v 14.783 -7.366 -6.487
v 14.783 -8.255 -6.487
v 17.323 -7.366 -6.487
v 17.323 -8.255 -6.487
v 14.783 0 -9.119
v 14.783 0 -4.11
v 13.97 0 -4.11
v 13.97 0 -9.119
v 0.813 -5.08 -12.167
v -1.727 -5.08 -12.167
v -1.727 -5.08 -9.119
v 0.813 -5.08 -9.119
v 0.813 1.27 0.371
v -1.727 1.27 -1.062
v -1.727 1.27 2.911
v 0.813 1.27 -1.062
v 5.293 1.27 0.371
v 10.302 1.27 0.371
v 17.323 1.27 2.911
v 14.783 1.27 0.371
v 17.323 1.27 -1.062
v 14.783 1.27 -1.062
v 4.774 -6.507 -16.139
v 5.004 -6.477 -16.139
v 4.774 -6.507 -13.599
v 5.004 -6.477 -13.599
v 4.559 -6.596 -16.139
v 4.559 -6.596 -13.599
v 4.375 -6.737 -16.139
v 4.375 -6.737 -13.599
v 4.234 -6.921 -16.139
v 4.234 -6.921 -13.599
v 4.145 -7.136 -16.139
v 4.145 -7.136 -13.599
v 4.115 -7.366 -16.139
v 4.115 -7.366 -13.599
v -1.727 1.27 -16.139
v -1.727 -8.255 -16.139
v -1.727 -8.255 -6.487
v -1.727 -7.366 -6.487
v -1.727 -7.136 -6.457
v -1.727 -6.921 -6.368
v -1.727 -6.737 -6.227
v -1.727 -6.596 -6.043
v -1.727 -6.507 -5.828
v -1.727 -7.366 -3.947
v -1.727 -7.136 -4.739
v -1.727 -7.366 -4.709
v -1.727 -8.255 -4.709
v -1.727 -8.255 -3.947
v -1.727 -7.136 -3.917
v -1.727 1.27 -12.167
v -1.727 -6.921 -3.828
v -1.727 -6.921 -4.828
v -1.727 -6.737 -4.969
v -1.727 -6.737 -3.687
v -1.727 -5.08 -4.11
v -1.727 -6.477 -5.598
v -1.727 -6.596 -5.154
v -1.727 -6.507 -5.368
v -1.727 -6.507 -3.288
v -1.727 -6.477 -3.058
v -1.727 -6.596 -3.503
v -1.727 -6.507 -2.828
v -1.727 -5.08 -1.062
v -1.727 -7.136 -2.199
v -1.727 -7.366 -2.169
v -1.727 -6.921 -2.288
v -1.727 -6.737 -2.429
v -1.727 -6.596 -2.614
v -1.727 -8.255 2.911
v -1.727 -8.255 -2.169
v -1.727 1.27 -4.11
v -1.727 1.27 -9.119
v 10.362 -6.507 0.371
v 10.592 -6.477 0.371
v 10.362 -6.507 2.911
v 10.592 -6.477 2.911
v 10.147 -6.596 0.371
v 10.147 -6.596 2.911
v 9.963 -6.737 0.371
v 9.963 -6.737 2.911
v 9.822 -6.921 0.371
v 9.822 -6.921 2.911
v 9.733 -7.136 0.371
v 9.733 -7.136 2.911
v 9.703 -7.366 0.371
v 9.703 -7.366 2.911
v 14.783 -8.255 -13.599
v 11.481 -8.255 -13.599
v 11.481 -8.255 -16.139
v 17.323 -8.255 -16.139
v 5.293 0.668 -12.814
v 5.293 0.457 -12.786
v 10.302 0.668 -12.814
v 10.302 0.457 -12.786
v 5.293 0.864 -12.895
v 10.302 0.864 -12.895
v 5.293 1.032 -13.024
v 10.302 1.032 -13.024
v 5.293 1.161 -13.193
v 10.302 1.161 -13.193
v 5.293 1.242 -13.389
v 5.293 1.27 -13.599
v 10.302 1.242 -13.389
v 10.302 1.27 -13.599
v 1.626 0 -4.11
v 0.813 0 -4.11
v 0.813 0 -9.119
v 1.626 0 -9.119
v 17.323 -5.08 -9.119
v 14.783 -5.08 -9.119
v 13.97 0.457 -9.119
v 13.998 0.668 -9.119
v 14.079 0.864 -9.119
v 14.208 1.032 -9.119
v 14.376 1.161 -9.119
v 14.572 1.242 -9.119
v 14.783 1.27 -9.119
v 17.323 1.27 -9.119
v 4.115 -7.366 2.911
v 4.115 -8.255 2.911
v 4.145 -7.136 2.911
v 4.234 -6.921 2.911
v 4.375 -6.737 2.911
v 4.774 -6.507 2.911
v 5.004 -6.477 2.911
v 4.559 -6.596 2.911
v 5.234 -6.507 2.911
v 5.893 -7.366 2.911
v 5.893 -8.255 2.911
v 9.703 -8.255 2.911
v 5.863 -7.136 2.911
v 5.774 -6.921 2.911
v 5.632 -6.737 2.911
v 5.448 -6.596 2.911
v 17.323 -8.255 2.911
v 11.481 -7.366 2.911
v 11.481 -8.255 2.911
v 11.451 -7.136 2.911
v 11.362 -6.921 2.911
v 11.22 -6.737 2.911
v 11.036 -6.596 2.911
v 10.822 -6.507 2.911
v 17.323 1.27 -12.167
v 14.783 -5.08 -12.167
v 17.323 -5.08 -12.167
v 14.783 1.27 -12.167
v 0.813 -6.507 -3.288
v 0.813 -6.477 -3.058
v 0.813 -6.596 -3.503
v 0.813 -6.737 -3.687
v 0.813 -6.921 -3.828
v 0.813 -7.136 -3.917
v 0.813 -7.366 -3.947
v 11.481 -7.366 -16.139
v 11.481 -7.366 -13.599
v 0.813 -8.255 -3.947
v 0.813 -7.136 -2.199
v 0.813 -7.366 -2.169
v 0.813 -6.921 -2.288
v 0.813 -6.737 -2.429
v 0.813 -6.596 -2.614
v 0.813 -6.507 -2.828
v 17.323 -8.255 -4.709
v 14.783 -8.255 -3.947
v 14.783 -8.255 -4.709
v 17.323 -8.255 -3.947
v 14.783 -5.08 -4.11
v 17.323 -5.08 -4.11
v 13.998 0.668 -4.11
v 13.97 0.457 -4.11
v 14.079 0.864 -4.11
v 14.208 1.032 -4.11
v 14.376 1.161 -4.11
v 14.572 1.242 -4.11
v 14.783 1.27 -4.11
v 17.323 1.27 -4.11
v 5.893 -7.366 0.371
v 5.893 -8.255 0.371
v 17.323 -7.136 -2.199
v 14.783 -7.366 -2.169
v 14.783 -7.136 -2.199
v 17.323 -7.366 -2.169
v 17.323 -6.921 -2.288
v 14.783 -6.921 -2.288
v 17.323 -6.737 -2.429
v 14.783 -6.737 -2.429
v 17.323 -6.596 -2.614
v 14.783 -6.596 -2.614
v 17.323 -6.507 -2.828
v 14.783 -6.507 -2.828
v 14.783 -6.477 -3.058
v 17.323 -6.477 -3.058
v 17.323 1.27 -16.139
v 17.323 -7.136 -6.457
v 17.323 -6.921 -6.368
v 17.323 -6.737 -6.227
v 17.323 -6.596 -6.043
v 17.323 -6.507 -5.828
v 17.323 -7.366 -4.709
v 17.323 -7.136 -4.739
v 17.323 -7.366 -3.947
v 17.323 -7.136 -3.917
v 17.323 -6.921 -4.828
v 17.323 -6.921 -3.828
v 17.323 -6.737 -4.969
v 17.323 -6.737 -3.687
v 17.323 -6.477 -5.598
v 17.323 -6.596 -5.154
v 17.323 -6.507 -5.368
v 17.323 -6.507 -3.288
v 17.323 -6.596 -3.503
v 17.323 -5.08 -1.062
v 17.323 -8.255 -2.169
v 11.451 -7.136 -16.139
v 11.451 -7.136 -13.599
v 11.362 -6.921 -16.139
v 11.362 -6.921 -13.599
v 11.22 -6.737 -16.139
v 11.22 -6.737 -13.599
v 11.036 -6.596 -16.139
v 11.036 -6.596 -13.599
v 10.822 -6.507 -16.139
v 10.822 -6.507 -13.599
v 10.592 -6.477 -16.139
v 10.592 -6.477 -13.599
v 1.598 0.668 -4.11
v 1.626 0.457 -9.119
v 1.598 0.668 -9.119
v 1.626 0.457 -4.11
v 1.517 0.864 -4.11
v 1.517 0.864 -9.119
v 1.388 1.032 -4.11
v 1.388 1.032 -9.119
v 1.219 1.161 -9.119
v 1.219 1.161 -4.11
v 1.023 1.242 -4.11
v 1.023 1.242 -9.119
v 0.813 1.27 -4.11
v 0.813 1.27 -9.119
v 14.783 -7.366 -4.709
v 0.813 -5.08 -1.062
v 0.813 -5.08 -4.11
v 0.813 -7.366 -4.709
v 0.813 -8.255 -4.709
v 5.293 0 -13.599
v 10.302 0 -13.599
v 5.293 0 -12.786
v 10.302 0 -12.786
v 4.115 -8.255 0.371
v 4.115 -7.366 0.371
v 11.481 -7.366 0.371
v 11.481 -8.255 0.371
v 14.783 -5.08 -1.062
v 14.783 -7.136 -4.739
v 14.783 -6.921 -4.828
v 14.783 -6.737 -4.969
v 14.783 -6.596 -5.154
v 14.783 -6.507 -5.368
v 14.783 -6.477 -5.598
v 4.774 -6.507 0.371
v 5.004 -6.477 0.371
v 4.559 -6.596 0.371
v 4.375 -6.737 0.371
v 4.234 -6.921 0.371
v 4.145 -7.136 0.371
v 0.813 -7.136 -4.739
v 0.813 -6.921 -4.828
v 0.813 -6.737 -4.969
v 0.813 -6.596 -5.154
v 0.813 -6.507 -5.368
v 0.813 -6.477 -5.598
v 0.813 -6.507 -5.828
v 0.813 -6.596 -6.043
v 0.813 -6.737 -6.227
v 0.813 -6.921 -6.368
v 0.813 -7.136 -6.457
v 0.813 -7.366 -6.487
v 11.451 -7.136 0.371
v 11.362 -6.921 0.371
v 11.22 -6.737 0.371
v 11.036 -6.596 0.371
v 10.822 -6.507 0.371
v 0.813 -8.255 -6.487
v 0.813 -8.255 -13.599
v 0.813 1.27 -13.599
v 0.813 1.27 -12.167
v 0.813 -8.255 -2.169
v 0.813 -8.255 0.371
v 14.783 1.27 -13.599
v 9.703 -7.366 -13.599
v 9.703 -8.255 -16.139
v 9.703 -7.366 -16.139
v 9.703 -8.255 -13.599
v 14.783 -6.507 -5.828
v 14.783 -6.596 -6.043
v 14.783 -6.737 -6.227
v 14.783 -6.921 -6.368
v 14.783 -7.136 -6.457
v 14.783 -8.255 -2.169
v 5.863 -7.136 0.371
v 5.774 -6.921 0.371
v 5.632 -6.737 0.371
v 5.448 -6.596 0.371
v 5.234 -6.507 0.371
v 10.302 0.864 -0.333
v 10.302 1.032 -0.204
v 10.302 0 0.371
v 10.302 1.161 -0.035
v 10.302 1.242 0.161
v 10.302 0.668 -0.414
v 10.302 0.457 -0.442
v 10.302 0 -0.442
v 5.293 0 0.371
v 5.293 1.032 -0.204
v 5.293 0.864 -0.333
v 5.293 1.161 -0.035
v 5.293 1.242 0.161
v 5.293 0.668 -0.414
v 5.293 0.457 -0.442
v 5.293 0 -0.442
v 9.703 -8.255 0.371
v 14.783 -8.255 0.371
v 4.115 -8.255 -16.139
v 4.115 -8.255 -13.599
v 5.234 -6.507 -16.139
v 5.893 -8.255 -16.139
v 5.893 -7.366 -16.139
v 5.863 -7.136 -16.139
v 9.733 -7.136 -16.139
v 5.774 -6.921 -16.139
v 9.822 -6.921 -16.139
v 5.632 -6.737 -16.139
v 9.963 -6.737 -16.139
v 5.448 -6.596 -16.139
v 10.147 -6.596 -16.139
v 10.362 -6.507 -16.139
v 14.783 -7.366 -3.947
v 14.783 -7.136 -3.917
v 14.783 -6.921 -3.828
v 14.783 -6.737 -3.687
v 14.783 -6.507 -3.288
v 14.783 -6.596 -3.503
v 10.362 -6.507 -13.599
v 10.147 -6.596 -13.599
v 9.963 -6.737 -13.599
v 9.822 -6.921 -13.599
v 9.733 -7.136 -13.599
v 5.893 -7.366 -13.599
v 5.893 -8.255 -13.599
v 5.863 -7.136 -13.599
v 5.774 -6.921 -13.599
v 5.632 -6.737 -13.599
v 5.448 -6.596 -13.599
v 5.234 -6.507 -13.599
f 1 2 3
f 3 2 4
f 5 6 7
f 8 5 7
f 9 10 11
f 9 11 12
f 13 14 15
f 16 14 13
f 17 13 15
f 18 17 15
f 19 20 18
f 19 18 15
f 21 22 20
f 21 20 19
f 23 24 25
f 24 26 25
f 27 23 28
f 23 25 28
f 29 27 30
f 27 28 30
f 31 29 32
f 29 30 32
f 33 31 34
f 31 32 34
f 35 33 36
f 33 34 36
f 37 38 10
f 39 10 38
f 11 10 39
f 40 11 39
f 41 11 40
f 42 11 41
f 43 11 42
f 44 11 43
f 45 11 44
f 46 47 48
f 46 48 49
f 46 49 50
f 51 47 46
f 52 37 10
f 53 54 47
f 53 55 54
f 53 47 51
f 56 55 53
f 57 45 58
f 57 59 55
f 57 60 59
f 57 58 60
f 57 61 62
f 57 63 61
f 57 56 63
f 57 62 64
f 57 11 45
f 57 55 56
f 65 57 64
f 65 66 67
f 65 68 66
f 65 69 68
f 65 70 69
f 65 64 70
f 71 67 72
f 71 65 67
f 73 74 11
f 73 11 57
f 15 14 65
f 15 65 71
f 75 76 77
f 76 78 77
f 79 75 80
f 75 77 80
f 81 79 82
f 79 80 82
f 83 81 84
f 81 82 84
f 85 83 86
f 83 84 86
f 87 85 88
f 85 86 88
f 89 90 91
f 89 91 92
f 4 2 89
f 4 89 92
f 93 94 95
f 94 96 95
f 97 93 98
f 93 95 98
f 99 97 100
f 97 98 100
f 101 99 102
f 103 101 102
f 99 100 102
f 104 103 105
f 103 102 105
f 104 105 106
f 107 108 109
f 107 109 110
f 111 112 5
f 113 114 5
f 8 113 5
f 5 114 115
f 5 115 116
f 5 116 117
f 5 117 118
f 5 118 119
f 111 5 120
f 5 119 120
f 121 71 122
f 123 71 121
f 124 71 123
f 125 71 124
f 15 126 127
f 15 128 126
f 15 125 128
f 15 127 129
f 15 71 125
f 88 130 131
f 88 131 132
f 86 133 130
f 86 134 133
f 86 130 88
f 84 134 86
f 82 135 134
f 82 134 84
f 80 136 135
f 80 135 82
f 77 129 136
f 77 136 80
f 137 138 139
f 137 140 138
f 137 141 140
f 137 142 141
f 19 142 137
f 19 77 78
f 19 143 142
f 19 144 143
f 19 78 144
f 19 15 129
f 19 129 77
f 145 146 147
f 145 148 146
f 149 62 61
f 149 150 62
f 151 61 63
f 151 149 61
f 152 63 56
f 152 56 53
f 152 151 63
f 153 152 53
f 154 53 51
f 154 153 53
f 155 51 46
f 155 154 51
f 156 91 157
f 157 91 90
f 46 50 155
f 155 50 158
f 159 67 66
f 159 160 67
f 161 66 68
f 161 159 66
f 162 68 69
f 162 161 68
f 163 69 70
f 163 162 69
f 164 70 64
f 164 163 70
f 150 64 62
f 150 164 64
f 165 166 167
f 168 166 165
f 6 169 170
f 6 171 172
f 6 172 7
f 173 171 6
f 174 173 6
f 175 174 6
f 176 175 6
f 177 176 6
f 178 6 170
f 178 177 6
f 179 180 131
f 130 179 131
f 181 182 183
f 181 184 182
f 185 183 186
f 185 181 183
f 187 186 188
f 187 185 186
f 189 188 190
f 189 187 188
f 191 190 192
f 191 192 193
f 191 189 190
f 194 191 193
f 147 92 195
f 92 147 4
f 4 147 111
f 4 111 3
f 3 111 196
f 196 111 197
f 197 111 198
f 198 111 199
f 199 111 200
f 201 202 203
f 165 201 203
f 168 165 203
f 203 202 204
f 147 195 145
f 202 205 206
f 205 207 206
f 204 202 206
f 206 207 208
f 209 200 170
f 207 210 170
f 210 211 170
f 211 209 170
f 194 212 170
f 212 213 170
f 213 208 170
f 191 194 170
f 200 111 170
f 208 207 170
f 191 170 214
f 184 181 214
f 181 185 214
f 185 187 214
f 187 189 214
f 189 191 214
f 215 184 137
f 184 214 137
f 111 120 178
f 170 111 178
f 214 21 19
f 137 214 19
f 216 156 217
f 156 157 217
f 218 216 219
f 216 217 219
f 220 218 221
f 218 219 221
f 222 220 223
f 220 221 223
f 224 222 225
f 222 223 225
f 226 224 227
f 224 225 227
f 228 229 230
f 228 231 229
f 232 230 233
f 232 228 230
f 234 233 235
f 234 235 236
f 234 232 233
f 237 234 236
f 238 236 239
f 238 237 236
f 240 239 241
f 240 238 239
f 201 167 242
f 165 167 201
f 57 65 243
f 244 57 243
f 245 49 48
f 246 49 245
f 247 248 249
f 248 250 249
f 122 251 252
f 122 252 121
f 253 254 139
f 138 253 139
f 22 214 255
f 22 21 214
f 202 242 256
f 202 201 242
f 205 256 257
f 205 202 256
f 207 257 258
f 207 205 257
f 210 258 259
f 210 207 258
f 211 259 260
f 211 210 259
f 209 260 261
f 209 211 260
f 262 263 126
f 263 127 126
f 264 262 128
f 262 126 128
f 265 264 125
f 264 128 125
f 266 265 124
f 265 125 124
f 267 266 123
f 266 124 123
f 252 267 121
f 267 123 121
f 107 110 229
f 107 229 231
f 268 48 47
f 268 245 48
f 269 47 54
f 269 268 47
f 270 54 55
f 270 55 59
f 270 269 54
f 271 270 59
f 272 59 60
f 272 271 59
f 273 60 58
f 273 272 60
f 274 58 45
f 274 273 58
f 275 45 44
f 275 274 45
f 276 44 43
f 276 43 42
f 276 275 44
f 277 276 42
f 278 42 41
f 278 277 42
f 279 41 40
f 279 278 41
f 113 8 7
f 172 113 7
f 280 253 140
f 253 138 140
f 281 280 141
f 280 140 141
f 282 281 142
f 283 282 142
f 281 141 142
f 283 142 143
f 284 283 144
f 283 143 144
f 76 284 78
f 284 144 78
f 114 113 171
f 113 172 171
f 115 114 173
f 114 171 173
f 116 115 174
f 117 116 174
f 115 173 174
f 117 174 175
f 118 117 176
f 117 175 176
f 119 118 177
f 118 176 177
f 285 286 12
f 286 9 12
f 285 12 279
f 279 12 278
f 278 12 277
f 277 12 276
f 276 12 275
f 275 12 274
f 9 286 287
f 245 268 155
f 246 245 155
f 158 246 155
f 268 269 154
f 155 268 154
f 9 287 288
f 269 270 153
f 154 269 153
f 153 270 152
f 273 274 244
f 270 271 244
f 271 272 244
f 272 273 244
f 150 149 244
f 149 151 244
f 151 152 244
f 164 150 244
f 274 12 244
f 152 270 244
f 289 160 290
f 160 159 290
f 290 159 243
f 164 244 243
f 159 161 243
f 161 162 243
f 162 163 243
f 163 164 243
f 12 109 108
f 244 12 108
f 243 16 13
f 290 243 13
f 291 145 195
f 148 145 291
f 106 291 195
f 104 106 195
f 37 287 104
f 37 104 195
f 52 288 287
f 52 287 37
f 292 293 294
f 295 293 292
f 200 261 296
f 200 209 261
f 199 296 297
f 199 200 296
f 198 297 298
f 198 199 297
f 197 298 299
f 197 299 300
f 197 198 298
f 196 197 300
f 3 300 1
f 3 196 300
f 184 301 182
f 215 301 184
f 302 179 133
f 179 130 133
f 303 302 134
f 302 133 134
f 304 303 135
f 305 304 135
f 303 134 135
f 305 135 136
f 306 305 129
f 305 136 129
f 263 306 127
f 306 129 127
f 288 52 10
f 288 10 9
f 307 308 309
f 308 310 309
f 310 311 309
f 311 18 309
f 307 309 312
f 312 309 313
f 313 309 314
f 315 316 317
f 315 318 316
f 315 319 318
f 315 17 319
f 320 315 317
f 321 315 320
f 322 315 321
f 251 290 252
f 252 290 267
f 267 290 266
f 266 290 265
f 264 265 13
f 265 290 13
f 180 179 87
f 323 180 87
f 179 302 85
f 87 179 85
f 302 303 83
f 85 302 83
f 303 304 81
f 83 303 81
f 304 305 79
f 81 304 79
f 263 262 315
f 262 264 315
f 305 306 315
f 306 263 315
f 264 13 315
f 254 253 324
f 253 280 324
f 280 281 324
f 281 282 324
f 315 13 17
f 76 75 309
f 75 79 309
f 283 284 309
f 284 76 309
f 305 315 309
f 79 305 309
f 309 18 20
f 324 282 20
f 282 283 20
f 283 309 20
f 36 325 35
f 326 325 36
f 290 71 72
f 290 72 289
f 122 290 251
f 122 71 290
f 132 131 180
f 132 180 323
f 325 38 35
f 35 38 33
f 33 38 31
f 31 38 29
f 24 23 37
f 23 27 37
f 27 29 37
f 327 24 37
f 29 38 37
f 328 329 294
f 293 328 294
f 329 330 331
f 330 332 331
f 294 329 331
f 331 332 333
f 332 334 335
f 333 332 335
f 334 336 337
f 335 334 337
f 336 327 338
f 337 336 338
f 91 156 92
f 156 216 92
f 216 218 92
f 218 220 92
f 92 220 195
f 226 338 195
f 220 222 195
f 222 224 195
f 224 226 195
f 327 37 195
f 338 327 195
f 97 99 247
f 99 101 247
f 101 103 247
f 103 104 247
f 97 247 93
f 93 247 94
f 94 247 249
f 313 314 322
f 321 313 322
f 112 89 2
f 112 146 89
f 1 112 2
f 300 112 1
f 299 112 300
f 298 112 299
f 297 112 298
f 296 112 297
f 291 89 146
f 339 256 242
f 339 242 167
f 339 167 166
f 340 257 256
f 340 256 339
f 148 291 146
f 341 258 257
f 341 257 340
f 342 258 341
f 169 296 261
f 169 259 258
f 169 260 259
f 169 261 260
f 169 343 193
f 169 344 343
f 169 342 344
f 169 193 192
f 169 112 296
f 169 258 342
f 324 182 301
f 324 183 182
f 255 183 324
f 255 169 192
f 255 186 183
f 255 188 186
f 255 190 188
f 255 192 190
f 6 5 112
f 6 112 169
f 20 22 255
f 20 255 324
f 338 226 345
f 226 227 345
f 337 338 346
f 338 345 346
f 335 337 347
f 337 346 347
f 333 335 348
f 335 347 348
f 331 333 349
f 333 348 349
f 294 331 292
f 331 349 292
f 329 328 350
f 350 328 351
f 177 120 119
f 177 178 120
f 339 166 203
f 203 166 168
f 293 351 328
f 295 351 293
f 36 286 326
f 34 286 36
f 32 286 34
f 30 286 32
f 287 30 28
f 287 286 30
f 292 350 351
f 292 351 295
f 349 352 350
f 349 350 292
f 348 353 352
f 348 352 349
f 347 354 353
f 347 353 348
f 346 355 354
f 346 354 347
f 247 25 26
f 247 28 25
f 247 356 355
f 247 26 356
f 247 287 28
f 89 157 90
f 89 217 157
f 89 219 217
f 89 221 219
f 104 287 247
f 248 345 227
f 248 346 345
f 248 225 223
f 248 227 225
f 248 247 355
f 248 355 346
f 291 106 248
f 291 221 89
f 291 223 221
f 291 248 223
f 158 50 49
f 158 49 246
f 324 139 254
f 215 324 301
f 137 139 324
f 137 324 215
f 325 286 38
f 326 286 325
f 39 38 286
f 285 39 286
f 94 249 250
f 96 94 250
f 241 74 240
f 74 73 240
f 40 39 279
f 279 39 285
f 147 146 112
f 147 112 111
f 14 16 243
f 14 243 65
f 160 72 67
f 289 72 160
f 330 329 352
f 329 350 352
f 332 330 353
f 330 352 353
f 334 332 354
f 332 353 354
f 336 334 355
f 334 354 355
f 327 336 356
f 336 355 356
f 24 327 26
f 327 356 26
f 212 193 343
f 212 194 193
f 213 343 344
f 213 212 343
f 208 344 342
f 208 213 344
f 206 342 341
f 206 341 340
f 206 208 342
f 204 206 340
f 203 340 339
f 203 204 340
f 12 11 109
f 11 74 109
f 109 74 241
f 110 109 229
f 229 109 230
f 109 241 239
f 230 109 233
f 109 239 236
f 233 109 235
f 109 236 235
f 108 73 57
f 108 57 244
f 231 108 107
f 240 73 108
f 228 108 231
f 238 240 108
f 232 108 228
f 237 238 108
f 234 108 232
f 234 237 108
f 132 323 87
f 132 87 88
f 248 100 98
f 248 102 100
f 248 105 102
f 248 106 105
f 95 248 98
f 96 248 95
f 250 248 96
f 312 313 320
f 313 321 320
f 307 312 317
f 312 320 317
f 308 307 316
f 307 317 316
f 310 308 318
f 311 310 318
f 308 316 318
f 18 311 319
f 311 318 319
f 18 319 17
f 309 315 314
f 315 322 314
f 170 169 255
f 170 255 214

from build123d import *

# Parameters (mm, degrees)
BOSS_EXTRUDE1_DEPTH   = 1.27
SKETCH1_W             = 3.3528
SKETCH1_H             = 2.50444
BOSS_EXTRUDE1_2_DEPTH = 1.27
FILLET3_R             = 0.8128
FILLET4_R             = 0.8128
SKETCH5_W             = 2.54
SKETCH5_H             = 5.00888
BOSS_EXTRUDE3_DEPTH   = 5.08
SKETCH6_W             = 19.05
SKETCH6_H             = 19.05
SKETCH6_W_2           = 13.97
SKETCH6_H_2           = 13.97
BOSS_EXTRUDE4_DEPTH   = 3.175
SKETCH7_W             = 2.54
SKETCH7_H             = 1.778
SKETCH7_W_2           = 1.778
SKETCH7_H_2           = 2.54
CUT_EXTRUDE2_DEPTH    = 1.778
FILLET6_R             = 0.889


with BuildPart() as part:
    # Sketch1 → Boss-Extrude1 (new body)
    with BuildSketch(Plane(origin=(0, 0, 0), x_dir=(1, 0, 0), z_dir=(0, 1, 0))):
        Polygon((0.8128, 1.061632718), (0.8128, -0.370927282), (5.29336, -0.370927282), (5.29336, 0.441872718), (7.7978, 0.441872718), (7.7978, -2.910927282), (-1.7272, -2.910927282), (-1.7272, 1.061632718), align=None)
    extrude(amount=BOSS_EXTRUDE1_DEPTH)

    # Fillet3
    fillet3_edges = [part.edges().sort_by_distance(p)[0] for p in [
        (6.54558, 1.27, -0.441872718),
    ]]
    fillet(fillet3_edges, radius=FILLET3_R)


with BuildPart() as body_2:
    # Sketch1 → Boss-Extrude1 2 (new body)
    with BuildSketch(Plane(origin=(0, 0, 0), x_dir=(1, 0, 0), z_dir=(0, 1, 0))):
        with Locations((-0.0508, 5.361852718)):
            Rectangle(SKETCH1_W, SKETCH1_H)
    extrude(amount=BOSS_EXTRUDE1_2_DEPTH)

    # Fillet4
    fillet4_edges = [body_2.edges().sort_by_distance(p)[0] for p in [
        (1.6256, 1.27, -5.361852718),
    ]]
    fillet(fillet4_edges, radius=FILLET4_R)


with BuildPart() as body_3:
    # Mirror6: mirrored copy
    add(part.part.mirror(Plane(origin=(7.7978, 1.27, -0.441872718), x_dir=(0, 0, 1), z_dir=(-1, 0, 0))))


with BuildPart() as body_4:
    # Mirror6 2: mirrored copy
    add(body_2.part.mirror(Plane(origin=(7.7978, 1.27, -0.441872718), x_dir=(0, 0, 1), z_dir=(-1, 0, 0))))


with BuildPart() as body_5:
    # Mirror7: mirrored copy
    add(body_3.part.mirror(Plane(origin=(17.3228, 1.27, -6.614072718), x_dir=(1, 0, 0), z_dir=(0, 0, 1))))


with BuildPart() as body_6:
    # Mirror7 2: mirrored copy
    add(body_4.part.mirror(Plane(origin=(17.3228, 1.27, -6.614072718), x_dir=(1, 0, 0), z_dir=(0, 0, 1))))


with BuildPart() as body_7:
    # Mirror8: mirrored copy
    add(body_5.part.mirror(Plane(origin=(7.7978, 1.27, -12.786272718), x_dir=(0, 0, 1), z_dir=(1, 0, 0))))


with BuildPart() as body_8:
    # Mirror8 2: mirrored copy
    add(body_6.part.mirror(Plane(origin=(7.7978, 1.27, -12.786272718), x_dir=(0, 0, 1), z_dir=(1, 0, 0))))


with BuildPart() as part_1:
    add(part.part)

    add(body_2.part)  # Boss-Extrude3 merges body 2

    add(body_3.part)  # Boss-Extrude3 merges body 3

    add(body_4.part)  # Boss-Extrude3 merges body 4

    add(body_5.part)  # Boss-Extrude3 merges body 5

    add(body_6.part)  # Boss-Extrude3 merges body 6

    add(body_7.part)  # Boss-Extrude3 merges body 7

    add(body_8.part)  # Boss-Extrude3 merges body 8
    # Sketch5 → Boss-Extrude3 (add)
    with BuildSketch(Plane.XZ):
        Polygon((17.3228, -1.061632718), (14.7828, -1.061632718), (14.7828, 0.370927282), (0.8128, 0.370927282), (0.8128, -1.061632718), (-1.7272, -1.061632718), (-1.7272, 2.910927282), (17.3228, 2.910927282), align=None)
        Polygon((17.3228, -16.139072718), (-1.7272, -16.139072718), (-1.7272, -12.166512718), (0.8128, -12.166512718), (0.8128, -13.599072718), (14.7828, -13.599072718), (14.7828, -12.166512718), (17.3228, -12.166512718), align=None)
        with Locations((16.0528, -6.614072718)):
            Rectangle(SKETCH5_W, SKETCH5_H)
        with Locations((-0.4572, -6.614072718)):
            Rectangle(SKETCH5_W, SKETCH5_H)
    extrude(amount=BOSS_EXTRUDE3_DEPTH)

    # Sketch6 → Boss-Extrude4 (add)
    with BuildSketch(Plane.XZ.offset(5.08)):
        with Locations((7.7978, -6.614072718)):
            Rectangle(SKETCH6_W, SKETCH6_H)
        with Locations((7.7978, -6.614072718)):
            Rectangle(SKETCH6_W_2, SKETCH6_H_2, mode=Mode.SUBTRACT)
    extrude(amount=BOSS_EXTRUDE4_DEPTH)

    # Sketch7 → Cut-Extrude2 (cut)
    with BuildSketch(Plane.XZ.offset(8.255)):
        with Locations((-0.4572, -5.598072718)):
            Rectangle(SKETCH7_W, SKETCH7_H)
        with Locations((-0.4572, -3.058072718)):
            Rectangle(SKETCH7_W, SKETCH7_H)
        with Locations((10.5918, 1.640927282)):
            Rectangle(SKETCH7_W_2, SKETCH7_H_2)
        with Locations((5.0038, 1.640927282)):
            Rectangle(SKETCH7_W_2, SKETCH7_H_2)
        with Locations((10.5918, -14.869072718)):
            Rectangle(SKETCH7_W_2, SKETCH7_H_2)
        with Locations((5.0038, -14.869072718)):
            Rectangle(SKETCH7_W_2, SKETCH7_H_2)
        with Locations((16.0528, -5.598072718)):
            Rectangle(SKETCH7_W, SKETCH7_H)
        with Locations((16.0528, -3.058072718)):
            Rectangle(SKETCH7_W, SKETCH7_H)
    extrude(amount=-CUT_EXTRUDE2_DEPTH, mode=Mode.SUBTRACT)

    # Fillet6
    fillet6_edges = [part_1.edges().sort_by_distance(p)[0] for p in [
        (-0.4572, -6.477, -4.709072718),
        (16.0528, -6.477, -4.709072718),
        (11.4808, -6.477, 1.640927282),
        (5.8928, -6.477, 1.640927282),
        (9.7028, -6.477, 1.640927282),
        (4.1148, -6.477, 1.640927282),
        (-0.4572, -6.477, -2.169072718),
        (16.0528, -6.477, -2.169072718),
        (-0.4572, -6.477, -6.487072718),
        (-0.4572, -6.477, -3.947072718),
        (16.0528, -6.477, -3.947072718),
        (16.0528, -6.477, -6.487072718),
        (4.1148, -6.477, -14.869072718),
        (9.7028, -6.477, -14.869072718),
        (5.8928, -6.477, -14.869072718),
        (11.4808, -6.477, -14.869072718),
    ]]
    fillet(fillet6_edges, radius=FILLET6_R - 0.0001)  # a hair under: the kernel refuses the full size


solid = part_1.part
